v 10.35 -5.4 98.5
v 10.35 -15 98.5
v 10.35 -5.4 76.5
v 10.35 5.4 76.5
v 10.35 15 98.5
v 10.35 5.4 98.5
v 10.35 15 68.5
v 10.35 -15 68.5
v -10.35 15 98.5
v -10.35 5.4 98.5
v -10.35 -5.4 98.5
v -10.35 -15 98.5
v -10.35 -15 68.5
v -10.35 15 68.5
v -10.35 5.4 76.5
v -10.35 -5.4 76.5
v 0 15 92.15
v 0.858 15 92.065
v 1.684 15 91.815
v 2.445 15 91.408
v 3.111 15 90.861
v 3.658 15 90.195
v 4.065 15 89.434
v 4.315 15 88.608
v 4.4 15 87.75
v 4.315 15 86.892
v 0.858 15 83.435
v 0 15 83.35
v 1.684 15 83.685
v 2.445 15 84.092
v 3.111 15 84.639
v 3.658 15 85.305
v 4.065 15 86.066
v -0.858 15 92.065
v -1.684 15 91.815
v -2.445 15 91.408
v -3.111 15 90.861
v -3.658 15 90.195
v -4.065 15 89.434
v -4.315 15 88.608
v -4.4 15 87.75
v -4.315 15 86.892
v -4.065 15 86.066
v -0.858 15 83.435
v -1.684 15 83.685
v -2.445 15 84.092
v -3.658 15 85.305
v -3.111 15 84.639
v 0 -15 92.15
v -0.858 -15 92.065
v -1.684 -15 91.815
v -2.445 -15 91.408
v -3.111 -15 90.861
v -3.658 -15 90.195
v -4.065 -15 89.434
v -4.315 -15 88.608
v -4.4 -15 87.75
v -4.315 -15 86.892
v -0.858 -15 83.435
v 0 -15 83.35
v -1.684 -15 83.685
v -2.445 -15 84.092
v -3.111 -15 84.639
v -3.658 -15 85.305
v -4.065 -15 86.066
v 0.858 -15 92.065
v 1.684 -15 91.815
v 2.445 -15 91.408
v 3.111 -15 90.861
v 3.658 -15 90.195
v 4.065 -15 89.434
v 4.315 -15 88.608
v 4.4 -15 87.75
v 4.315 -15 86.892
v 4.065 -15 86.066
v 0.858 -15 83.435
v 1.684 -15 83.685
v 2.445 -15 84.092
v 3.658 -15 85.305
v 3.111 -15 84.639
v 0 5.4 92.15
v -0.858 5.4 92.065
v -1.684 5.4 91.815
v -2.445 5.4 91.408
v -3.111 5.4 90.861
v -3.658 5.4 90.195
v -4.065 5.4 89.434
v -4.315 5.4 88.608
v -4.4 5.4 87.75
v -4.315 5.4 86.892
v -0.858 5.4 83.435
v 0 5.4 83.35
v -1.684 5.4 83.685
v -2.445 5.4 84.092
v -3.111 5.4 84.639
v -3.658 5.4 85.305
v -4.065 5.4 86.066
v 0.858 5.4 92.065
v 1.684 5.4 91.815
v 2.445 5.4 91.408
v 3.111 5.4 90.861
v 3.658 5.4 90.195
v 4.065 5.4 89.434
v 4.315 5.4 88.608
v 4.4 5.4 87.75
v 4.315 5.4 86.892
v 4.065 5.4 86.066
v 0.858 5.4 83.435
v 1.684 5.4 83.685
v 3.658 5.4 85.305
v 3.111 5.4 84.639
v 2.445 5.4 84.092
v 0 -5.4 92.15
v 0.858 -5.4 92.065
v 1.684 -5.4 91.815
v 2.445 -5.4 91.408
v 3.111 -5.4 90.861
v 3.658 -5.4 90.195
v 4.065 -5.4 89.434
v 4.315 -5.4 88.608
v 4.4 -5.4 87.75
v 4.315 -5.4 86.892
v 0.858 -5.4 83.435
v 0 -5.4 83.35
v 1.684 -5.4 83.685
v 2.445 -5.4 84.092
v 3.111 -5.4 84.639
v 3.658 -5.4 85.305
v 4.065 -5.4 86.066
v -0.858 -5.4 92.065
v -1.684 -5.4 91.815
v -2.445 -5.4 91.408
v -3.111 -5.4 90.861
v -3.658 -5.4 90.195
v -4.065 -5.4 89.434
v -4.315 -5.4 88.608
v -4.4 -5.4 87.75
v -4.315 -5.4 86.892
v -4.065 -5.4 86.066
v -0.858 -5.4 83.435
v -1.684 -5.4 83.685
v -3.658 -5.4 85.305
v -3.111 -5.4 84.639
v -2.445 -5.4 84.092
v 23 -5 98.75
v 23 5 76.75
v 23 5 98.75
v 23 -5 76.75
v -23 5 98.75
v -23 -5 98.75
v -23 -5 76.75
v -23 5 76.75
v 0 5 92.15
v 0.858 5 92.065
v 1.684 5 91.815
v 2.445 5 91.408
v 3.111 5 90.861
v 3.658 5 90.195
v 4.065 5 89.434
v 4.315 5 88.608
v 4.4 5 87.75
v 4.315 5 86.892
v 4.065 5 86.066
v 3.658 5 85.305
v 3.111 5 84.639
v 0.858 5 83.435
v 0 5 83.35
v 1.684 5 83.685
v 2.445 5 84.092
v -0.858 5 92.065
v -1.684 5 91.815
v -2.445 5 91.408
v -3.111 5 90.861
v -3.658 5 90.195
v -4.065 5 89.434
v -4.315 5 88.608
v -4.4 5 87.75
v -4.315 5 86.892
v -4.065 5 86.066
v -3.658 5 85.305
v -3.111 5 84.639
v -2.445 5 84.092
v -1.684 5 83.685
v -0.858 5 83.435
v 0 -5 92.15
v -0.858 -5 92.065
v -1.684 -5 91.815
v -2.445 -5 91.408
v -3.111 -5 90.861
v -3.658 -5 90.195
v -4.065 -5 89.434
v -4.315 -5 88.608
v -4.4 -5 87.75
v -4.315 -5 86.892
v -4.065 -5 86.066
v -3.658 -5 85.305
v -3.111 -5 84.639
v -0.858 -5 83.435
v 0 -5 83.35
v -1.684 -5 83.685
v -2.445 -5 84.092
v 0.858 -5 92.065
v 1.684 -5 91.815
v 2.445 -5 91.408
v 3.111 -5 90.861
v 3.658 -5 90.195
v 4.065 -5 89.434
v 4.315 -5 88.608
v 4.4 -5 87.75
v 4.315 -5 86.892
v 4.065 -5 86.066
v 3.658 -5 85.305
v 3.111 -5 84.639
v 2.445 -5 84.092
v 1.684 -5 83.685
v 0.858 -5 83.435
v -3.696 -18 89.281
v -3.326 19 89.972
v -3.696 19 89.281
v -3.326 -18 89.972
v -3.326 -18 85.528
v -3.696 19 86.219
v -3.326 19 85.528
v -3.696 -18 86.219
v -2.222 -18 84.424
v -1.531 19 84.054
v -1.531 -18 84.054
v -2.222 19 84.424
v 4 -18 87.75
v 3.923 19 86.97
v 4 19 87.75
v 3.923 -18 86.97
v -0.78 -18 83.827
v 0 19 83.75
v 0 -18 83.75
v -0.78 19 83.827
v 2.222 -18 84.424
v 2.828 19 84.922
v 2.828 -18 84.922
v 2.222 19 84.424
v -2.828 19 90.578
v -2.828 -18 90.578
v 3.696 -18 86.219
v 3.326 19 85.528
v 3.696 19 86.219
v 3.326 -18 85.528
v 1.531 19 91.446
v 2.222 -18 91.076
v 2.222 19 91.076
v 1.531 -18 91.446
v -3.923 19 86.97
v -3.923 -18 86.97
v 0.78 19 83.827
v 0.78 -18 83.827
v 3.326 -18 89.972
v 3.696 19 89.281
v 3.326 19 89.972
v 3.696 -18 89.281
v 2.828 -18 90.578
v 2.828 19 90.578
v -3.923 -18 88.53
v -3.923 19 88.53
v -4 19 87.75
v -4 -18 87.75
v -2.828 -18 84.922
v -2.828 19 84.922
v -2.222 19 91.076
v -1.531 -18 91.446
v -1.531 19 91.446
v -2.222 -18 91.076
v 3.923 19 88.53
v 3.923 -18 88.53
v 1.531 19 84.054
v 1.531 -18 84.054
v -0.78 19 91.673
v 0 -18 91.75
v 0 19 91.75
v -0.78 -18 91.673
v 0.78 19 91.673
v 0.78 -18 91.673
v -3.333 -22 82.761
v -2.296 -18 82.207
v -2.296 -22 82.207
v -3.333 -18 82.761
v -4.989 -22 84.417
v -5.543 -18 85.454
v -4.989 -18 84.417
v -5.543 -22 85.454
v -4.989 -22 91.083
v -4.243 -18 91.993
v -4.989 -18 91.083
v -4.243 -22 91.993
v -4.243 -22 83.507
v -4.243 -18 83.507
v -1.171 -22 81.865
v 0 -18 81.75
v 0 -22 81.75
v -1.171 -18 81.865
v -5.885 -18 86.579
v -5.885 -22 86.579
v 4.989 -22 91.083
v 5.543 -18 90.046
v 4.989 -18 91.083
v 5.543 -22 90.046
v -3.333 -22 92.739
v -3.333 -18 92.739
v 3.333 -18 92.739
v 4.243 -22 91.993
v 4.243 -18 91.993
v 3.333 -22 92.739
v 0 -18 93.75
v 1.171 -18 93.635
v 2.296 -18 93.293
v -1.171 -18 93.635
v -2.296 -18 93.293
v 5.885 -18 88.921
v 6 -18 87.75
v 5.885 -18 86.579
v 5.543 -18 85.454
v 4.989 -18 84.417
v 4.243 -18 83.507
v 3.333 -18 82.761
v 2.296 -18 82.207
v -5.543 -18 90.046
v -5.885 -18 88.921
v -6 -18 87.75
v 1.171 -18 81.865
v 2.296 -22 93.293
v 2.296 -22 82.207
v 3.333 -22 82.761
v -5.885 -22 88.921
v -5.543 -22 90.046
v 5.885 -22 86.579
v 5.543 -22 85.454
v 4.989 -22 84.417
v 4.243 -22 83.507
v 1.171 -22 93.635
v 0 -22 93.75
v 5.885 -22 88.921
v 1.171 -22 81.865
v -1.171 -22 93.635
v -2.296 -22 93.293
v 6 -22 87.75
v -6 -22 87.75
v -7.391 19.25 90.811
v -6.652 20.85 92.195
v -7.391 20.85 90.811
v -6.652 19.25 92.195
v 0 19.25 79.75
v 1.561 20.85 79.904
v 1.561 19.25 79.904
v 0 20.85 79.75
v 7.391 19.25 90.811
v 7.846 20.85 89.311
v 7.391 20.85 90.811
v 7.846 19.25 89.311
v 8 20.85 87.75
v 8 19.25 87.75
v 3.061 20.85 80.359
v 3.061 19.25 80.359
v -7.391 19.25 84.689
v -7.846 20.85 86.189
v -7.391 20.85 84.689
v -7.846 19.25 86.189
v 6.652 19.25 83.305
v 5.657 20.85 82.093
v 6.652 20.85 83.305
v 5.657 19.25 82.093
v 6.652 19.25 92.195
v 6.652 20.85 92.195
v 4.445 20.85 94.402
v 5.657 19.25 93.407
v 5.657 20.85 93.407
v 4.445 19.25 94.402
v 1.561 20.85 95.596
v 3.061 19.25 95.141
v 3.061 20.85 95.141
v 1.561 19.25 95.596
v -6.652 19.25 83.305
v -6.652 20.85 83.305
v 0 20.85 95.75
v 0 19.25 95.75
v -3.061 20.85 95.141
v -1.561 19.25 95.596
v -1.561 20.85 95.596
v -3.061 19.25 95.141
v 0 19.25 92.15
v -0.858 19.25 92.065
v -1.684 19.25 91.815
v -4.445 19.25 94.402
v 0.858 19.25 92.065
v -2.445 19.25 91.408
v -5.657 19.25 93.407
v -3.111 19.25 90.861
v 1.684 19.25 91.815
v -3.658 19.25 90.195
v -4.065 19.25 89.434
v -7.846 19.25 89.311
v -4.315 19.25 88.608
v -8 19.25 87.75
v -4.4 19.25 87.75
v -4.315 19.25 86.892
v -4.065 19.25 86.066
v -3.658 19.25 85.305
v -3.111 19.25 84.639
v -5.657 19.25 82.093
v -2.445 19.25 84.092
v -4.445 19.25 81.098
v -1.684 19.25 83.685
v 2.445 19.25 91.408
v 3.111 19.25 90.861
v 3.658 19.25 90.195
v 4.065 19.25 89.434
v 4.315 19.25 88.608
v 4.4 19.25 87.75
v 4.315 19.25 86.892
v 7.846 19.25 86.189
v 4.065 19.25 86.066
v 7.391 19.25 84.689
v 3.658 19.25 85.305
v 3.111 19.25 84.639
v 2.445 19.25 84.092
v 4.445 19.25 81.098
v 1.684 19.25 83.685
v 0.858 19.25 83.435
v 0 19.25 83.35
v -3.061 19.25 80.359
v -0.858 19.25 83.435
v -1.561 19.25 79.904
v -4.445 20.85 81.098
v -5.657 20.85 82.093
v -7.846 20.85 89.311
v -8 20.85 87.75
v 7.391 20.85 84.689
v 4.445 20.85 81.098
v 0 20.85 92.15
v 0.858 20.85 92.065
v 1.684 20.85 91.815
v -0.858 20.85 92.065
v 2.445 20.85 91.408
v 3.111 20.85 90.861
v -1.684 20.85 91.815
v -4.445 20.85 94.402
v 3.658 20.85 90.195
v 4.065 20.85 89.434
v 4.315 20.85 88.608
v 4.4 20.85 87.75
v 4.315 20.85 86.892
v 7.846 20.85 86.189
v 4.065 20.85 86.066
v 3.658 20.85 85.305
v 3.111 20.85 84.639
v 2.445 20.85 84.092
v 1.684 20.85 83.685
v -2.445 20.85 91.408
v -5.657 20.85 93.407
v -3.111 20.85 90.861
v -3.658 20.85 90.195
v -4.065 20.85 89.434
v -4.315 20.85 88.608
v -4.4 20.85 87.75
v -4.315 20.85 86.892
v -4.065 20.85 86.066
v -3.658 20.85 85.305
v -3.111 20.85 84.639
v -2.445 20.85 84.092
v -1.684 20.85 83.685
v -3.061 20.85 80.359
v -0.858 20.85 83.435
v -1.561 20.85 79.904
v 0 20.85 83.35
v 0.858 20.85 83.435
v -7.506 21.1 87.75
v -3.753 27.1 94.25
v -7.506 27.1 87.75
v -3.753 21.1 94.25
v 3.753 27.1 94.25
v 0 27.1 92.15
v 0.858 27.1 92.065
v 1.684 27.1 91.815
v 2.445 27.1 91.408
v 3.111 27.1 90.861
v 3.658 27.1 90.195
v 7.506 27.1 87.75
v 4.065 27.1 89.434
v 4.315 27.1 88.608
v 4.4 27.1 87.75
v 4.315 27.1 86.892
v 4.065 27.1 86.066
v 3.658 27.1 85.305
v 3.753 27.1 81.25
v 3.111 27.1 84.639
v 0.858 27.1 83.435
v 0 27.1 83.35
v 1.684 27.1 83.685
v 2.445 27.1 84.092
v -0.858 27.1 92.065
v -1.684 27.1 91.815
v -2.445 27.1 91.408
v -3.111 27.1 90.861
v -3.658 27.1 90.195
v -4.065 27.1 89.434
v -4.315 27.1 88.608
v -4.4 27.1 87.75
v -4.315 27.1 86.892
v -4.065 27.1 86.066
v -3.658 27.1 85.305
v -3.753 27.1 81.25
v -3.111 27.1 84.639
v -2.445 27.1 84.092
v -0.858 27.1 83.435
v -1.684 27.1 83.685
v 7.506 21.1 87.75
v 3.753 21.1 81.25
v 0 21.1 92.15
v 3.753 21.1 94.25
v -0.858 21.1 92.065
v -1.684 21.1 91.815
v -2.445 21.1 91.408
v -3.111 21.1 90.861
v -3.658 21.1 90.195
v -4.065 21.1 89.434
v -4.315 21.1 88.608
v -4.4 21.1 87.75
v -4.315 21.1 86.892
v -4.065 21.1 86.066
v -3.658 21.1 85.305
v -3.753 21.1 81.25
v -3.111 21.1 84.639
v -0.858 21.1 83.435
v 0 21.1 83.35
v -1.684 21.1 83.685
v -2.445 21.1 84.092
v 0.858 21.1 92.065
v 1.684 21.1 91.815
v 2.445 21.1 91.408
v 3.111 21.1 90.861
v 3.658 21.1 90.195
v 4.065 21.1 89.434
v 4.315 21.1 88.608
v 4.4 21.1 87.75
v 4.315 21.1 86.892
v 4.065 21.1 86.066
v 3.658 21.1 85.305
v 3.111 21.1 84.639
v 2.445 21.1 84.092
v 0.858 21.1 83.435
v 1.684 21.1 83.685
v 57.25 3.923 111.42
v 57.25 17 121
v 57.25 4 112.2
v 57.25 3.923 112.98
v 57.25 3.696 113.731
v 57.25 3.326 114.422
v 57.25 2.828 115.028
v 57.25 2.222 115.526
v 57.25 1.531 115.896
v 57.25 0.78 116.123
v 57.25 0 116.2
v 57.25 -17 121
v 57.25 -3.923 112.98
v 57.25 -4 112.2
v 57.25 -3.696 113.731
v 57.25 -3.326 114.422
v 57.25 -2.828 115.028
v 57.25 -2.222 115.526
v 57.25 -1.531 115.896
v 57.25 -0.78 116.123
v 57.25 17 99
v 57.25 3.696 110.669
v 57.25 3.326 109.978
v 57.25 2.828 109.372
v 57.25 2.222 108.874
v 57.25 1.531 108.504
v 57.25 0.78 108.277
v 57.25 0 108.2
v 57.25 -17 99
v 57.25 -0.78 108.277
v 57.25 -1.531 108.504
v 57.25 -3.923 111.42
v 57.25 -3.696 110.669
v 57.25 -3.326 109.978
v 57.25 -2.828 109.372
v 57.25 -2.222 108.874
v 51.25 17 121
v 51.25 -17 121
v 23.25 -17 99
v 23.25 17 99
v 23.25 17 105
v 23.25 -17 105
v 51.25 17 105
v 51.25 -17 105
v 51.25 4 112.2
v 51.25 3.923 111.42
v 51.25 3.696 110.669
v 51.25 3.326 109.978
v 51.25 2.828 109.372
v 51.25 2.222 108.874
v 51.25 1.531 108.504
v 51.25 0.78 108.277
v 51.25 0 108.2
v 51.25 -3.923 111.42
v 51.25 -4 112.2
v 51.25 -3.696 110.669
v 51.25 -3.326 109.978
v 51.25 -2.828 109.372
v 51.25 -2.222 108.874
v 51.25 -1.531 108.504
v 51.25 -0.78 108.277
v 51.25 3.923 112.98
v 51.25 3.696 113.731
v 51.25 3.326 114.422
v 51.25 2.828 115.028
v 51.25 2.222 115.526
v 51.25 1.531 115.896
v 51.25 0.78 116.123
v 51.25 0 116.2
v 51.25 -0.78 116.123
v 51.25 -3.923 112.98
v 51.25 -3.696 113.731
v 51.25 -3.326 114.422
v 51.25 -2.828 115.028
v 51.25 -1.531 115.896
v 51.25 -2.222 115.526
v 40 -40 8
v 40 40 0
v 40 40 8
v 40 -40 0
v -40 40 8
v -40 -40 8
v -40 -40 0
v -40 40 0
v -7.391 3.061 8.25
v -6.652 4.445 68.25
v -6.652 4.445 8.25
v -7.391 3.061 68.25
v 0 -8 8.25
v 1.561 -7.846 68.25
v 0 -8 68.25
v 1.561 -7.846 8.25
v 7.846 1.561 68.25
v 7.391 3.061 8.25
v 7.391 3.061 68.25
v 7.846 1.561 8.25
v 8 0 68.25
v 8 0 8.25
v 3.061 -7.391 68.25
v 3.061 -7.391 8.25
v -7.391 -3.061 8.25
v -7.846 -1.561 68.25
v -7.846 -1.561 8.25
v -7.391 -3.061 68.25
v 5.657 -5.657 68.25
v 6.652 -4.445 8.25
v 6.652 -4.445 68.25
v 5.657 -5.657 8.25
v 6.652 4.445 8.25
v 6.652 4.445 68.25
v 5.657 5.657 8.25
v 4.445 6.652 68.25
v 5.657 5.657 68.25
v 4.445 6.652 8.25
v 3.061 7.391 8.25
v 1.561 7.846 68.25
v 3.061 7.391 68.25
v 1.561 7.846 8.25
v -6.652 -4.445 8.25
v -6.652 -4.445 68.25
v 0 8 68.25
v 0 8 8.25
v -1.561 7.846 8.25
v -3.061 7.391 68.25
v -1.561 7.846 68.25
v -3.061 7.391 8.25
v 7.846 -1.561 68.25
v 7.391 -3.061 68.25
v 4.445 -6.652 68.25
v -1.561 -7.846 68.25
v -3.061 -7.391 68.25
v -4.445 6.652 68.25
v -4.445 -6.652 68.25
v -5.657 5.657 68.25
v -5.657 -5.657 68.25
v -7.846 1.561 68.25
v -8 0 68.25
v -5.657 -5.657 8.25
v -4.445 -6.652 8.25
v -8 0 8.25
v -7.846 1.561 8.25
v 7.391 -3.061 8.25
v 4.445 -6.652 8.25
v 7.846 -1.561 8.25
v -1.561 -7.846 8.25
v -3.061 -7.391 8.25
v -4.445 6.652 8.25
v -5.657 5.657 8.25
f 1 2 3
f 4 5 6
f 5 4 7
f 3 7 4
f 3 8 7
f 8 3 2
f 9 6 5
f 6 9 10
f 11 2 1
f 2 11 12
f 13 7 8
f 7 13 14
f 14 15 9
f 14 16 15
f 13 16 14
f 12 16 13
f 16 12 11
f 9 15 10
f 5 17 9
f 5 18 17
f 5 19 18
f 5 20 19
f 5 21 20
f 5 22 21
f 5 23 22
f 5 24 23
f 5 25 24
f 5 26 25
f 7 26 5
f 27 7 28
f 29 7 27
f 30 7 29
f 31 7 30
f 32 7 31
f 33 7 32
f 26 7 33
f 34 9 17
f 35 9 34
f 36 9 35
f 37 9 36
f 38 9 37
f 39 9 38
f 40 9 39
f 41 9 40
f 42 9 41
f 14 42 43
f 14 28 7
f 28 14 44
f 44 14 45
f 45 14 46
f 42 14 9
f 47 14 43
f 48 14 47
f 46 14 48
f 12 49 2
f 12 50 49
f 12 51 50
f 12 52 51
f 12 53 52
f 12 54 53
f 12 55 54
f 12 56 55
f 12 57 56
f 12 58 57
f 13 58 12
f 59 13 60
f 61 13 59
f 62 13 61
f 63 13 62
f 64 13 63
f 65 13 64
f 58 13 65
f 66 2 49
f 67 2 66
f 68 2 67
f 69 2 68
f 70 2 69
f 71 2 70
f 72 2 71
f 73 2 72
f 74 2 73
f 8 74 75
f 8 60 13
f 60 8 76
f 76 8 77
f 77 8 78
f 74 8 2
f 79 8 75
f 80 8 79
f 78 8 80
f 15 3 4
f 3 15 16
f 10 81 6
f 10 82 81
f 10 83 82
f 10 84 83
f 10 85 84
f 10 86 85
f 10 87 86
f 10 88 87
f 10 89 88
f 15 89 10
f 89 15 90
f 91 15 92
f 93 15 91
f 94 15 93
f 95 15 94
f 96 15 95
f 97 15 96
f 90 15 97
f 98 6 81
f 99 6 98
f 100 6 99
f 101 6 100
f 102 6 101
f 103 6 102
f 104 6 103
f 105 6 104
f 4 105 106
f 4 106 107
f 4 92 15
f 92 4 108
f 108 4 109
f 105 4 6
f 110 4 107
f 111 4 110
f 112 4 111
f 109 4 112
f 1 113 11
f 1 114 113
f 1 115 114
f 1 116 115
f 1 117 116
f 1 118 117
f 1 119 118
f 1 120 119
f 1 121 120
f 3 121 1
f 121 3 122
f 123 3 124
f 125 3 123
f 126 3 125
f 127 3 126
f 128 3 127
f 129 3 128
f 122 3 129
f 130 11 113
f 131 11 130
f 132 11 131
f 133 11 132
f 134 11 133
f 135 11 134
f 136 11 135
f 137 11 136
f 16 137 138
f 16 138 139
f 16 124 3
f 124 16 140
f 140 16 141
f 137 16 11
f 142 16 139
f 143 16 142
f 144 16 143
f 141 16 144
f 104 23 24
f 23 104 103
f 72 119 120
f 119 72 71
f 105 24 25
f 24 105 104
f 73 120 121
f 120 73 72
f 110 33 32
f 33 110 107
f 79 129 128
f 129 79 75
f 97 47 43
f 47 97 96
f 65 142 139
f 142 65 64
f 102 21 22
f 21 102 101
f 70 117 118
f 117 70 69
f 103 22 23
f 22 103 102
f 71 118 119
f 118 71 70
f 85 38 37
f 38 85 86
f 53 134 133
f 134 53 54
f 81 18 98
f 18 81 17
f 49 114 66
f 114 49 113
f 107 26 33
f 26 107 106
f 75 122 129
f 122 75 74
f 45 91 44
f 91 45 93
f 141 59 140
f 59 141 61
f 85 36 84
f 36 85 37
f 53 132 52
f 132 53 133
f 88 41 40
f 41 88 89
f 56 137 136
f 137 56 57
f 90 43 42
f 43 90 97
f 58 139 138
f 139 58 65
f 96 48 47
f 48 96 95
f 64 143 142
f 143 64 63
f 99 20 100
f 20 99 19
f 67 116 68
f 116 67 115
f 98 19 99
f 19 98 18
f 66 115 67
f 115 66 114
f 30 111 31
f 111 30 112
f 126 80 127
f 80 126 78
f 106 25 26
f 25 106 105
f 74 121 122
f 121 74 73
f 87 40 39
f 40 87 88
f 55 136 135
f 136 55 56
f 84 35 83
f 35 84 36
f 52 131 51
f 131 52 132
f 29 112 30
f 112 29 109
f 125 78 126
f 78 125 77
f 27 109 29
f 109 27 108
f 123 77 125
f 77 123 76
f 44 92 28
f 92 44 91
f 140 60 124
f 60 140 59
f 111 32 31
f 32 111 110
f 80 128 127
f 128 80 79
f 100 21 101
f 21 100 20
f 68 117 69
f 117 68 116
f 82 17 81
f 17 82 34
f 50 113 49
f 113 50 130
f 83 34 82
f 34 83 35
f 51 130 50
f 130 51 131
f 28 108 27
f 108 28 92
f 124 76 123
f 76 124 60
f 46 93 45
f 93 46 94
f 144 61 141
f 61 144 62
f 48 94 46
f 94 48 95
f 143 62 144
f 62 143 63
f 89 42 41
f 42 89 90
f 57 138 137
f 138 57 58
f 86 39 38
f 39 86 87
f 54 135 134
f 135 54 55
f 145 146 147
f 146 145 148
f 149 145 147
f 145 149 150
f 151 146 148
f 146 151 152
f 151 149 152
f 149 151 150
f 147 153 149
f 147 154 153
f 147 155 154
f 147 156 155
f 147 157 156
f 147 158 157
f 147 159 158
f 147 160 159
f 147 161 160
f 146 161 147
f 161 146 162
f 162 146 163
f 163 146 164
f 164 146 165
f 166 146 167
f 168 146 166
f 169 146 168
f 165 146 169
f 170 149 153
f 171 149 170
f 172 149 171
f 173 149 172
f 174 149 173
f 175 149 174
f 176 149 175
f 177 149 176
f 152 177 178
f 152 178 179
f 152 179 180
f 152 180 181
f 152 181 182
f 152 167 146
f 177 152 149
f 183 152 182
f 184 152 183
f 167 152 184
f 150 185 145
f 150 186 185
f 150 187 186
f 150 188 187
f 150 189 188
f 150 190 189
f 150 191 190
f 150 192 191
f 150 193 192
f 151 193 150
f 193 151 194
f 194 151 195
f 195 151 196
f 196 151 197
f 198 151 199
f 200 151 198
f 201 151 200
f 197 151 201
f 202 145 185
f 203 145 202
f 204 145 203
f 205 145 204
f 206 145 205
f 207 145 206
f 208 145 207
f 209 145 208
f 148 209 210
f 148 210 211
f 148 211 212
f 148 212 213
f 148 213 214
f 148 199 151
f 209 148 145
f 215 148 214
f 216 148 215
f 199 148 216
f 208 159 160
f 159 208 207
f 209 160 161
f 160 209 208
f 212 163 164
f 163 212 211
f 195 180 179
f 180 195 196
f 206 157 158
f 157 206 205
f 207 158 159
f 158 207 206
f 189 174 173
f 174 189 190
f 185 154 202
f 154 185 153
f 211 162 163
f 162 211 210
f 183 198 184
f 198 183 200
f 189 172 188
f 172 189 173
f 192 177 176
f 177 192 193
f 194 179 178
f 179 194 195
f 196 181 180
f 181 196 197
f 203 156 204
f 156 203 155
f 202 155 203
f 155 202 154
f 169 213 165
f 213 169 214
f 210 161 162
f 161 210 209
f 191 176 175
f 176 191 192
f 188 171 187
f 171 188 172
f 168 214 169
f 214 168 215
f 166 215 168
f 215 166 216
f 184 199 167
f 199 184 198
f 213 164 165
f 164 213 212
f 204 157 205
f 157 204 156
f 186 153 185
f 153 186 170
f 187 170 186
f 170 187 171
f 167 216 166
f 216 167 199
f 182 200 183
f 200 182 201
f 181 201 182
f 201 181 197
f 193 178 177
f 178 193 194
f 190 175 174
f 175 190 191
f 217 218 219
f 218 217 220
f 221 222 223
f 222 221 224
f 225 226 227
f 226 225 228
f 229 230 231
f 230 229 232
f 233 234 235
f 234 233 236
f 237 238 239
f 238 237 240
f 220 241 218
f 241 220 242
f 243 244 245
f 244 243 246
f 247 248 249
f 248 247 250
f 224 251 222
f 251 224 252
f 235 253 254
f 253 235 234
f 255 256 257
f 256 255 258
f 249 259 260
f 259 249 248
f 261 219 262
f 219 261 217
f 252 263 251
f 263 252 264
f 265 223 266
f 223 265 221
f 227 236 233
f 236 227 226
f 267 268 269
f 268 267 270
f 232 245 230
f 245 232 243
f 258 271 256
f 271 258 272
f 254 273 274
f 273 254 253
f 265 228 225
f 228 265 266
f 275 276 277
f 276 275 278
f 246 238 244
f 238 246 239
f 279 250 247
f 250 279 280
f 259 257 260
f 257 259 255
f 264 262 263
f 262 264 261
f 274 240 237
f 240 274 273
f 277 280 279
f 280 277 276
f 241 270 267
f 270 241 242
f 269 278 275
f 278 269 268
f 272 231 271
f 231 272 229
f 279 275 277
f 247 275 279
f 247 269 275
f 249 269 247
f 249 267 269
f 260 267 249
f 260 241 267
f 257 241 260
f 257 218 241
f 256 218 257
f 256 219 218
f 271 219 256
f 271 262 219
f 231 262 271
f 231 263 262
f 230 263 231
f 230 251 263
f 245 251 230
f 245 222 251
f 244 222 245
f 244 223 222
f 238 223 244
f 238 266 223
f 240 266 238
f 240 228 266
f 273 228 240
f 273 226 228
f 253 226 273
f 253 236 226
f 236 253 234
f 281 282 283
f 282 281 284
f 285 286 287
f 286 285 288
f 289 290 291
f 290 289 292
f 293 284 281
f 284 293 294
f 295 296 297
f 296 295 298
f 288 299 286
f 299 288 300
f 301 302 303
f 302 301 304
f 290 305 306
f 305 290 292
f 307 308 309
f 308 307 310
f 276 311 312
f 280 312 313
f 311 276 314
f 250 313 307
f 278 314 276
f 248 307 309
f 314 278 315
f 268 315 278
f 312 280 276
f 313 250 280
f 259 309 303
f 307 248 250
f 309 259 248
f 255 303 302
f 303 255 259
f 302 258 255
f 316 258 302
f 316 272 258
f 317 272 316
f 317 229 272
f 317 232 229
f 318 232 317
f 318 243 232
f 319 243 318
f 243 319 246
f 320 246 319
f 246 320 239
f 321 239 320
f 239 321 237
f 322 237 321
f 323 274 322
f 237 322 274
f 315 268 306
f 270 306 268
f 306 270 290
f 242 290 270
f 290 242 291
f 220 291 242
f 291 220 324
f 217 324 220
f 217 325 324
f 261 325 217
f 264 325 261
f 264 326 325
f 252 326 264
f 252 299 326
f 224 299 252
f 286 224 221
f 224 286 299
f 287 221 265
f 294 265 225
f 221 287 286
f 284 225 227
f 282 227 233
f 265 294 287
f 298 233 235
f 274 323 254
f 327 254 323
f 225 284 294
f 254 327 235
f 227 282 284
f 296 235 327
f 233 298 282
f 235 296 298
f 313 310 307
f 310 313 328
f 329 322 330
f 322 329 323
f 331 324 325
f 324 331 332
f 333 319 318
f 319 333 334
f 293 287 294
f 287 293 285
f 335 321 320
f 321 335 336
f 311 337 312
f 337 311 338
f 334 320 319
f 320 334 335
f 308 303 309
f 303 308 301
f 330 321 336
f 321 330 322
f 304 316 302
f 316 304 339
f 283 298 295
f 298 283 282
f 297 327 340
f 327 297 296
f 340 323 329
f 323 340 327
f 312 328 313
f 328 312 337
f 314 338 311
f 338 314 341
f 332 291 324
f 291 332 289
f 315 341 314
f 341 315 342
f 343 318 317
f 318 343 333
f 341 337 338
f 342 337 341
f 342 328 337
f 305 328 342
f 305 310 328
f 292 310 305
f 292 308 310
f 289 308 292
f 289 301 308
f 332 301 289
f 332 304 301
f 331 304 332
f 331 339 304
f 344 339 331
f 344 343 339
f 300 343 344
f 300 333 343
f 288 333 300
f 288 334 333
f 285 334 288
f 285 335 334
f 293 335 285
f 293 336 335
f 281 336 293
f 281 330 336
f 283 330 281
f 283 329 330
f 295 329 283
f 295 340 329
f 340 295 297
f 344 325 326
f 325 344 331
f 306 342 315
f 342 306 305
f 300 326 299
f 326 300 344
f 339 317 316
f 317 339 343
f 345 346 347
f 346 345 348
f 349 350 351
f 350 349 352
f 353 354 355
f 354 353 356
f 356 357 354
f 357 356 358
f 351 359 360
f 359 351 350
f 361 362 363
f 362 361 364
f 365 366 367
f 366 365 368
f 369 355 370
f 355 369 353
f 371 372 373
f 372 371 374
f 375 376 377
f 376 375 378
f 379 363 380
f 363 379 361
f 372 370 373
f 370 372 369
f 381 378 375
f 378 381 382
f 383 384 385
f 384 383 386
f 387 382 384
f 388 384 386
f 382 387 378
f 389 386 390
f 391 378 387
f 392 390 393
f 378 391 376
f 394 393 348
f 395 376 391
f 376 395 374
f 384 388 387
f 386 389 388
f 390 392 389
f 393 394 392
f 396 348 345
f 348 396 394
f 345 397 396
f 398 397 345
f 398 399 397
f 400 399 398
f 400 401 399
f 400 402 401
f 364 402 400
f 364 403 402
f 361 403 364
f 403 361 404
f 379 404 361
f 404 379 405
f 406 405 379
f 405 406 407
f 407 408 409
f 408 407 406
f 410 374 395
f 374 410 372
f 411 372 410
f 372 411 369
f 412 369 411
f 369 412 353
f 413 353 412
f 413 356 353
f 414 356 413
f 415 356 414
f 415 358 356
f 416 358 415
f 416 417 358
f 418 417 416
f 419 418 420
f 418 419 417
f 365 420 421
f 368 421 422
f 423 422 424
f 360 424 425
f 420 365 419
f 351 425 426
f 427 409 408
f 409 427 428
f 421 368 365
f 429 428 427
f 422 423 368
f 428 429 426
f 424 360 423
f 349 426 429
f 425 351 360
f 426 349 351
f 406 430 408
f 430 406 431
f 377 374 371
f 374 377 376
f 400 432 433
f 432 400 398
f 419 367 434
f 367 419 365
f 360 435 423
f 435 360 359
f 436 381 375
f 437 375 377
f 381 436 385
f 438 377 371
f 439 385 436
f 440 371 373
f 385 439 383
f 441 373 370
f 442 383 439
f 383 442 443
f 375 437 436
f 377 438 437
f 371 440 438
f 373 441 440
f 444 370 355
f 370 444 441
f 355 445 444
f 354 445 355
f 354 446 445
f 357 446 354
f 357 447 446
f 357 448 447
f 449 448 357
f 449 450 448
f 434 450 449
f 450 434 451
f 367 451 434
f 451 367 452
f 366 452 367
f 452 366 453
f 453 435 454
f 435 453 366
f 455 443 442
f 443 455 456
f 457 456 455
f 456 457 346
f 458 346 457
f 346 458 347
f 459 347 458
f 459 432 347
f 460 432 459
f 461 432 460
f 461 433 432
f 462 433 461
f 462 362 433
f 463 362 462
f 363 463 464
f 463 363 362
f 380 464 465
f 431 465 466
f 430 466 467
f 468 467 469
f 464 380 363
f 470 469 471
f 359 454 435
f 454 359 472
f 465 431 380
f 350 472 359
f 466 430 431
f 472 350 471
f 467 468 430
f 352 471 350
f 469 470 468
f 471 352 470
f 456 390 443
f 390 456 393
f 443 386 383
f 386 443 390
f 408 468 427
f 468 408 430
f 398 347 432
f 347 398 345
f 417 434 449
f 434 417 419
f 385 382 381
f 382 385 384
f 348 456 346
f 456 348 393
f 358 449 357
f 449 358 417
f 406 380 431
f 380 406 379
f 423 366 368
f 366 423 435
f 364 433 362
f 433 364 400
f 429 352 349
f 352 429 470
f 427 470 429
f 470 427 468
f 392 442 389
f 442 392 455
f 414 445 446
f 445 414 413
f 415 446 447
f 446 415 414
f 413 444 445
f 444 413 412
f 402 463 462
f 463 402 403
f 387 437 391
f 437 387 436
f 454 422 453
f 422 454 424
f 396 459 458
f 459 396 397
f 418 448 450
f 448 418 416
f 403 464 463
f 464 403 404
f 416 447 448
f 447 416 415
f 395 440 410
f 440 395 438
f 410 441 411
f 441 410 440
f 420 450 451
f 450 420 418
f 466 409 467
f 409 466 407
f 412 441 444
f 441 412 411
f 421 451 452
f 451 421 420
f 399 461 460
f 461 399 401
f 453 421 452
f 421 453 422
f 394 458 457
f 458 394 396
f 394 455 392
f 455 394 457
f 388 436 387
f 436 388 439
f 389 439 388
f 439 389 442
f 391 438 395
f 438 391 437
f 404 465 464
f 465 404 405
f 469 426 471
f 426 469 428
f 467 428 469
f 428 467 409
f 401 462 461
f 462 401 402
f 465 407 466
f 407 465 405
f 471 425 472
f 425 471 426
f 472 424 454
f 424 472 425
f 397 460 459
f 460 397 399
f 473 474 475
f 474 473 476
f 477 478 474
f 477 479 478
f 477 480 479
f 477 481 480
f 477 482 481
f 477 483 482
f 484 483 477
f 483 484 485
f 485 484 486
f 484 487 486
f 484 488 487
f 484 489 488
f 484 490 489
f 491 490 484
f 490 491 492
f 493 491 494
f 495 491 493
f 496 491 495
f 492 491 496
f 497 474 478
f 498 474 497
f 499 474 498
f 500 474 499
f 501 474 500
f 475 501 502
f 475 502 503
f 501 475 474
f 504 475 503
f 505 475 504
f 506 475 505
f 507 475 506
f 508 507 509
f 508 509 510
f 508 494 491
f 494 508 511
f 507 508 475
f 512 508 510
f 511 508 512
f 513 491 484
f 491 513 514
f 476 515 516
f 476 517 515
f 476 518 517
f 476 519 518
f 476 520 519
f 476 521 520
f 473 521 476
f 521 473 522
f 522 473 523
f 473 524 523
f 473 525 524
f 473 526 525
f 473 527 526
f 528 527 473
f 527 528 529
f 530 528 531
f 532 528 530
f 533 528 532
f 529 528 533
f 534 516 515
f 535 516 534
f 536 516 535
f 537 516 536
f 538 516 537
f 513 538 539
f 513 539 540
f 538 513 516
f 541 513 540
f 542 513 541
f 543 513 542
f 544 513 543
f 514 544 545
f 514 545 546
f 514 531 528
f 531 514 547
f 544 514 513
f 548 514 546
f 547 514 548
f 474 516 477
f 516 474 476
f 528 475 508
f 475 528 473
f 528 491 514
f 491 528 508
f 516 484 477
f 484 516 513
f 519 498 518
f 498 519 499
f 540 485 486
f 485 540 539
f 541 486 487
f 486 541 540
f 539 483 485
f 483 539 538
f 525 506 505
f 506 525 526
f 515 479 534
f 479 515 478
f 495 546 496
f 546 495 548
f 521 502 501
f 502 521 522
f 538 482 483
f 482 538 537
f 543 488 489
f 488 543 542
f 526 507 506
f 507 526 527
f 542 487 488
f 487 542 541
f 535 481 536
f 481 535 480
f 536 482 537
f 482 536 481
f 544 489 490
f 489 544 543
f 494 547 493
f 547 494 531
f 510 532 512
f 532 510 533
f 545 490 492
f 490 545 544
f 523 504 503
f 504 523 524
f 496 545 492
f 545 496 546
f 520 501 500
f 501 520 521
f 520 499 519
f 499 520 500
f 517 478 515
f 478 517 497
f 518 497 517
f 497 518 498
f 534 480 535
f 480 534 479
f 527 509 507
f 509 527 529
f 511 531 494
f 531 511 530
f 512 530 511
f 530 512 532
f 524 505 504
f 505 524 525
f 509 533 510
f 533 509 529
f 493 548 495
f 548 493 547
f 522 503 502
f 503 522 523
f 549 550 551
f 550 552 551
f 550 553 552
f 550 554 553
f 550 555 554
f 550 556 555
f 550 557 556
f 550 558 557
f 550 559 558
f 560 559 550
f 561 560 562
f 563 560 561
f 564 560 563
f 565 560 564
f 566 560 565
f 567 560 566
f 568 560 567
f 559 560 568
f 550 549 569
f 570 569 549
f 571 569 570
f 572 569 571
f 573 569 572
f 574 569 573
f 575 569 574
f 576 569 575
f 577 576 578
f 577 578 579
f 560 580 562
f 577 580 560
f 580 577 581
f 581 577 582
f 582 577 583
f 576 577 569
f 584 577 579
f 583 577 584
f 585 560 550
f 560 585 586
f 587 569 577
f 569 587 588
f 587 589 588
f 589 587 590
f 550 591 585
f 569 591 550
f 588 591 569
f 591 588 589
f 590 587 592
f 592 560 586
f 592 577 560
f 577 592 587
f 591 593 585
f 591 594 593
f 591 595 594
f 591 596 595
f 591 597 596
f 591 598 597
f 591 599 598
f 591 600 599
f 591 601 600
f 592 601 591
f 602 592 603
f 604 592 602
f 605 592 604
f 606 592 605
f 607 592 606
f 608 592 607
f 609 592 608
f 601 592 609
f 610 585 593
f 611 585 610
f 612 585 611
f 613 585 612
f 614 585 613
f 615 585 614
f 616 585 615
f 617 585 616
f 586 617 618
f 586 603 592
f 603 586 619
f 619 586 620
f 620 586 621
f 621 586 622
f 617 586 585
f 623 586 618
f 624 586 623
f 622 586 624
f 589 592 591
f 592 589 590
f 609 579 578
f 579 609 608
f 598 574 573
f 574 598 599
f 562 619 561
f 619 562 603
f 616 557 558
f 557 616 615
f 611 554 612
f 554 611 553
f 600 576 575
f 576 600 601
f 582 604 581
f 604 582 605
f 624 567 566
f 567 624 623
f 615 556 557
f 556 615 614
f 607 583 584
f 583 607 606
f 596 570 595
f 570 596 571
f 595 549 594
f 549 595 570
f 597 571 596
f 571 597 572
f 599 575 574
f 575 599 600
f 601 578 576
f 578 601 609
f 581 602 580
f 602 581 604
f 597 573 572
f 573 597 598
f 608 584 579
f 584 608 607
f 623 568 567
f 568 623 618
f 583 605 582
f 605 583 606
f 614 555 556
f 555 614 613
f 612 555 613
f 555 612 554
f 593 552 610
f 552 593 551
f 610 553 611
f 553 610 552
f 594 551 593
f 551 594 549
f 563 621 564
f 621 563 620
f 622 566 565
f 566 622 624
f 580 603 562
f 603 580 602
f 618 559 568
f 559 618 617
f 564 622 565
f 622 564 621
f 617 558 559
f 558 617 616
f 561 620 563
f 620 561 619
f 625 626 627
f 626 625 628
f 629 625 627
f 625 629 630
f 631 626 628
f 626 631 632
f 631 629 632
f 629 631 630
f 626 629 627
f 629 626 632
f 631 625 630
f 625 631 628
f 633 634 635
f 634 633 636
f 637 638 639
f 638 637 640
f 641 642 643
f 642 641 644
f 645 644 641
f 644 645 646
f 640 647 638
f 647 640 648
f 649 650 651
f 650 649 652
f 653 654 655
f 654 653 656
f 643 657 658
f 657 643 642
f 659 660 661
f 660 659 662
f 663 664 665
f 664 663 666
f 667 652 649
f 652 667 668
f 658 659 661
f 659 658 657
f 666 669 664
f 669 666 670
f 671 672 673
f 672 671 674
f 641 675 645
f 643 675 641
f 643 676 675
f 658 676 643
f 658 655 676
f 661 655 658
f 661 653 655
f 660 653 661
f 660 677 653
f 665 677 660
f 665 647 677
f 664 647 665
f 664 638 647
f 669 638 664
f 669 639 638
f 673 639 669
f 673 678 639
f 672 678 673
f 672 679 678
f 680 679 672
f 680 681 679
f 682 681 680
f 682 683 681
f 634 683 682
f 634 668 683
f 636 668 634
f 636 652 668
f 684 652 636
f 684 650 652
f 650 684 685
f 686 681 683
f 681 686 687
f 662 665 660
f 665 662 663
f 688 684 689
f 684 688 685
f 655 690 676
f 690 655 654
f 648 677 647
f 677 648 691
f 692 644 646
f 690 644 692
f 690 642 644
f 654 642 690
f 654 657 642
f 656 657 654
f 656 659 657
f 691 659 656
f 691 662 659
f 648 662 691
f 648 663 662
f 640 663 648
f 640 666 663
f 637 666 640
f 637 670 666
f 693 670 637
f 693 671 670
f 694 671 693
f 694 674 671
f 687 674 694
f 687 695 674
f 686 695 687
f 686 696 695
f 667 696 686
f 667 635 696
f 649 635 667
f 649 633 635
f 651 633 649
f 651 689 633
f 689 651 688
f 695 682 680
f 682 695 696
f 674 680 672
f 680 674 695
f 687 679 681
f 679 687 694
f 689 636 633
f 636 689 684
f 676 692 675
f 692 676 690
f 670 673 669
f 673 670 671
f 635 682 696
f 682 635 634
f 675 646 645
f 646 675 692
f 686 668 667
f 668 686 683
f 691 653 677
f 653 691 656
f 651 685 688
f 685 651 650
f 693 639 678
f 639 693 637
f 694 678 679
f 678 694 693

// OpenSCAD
$fn = 32;

// ------------------------------------------------------------------------
// Lamp arm: column d16 x 60 mm, arm 46 mm
// Every part is its own module, assembly() places every instance.
// ------------------------------------------------------------------------

// --- part 1 ---
module lamp_base() {
  difference() {
    translate([-40, -40, 0]) cube([80, 80, 8]);
  }
}

// --- part 2 ---
module lamp_column() {
  cylinder(h = 60, d = 16);
}

// --- part 3 ---
module head_fork() {
  difference() {
    translate([-10.35, -15, 0]) cube([20.7, 30, 30]);
    translate([-11.35, -5.4, 8]) cube([22.7, 10.8, 23]);
    translate([0, 0, 19.25]) rotate([90, 0, 0]) cylinder(h = 32, d = 8.8, center = true);
  }
}

// --- part 4 ---
module lamp_arm() {
  difference() {
    translate([-23, -5, 0]) cube([46, 10, 22]);
    translate([0, 0, 11]) rotate([90, 0, 0]) cylinder(h = 12, d = 8.8, center = true);
  }
}

// --- part 5 ---
module arm_pin() {
  rotate([0, 90, 0]) cylinder(h = 38, d = 8, center = true);
  translate([-22, 0, 0]) rotate([0, 90, 0]) cylinder(h = 4, d = 12);
}

// --- part 6 ---
module arm_washer() {
  difference() {
      translate([0, 0, 0]) cylinder(h = 1.6, d = 16);
      translate([0, 0, -1]) cylinder(h = 3.6, d = 8.8);
    }
}

// --- part 7 ---
module arm_nut() {
  difference() {
    linear_extrude(height = 6) polygon(points = [[7.506, 0], [3.753, 6.5], [-3.753, 6.5], [-7.506, 0], [-3.753, -6.5], [3.753, -6.5]]);
    translate([0, 0, -1]) cylinder(h = 8, d = 8.8);
  }
}

// --- part 8 ---
module shade_bracket() {
  difference() {
    translate([-17, -17, 0]) cube([34, 34, 22]);
    translate([-18, -18, 6]) cube([29, 36, 17]);
    translate([14, 0, 13.2]) rotate([0, 90, 0]) cylinder(h = 8, d = 8, center = true);
  }
}

// --- assembly ---
module assembly() {
  color([0.80, 0.24, 0.20]) translate([0, 0, 0]) rotate([0, 0, 0]) lamp_base();
  color([0.20, 0.45, 0.75]) translate([0, 0, 8.25]) rotate([0, 0, 0]) lamp_column();
  color([0.25, 0.62, 0.32]) translate([0, 0, 68.5]) rotate([0, 0, 0]) head_fork();
  color([0.92, 0.70, 0.18]) translate([0, 0, 76.75]) rotate([0, 0, 0]) lamp_arm();
  color([0.58, 0.35, 0.70]) translate([0, 0, 87.75]) rotate([0, 0, 90]) arm_pin();
  color([0.16, 0.66, 0.66]) translate([0, 20.85, 87.75]) rotate([90, 0, 0]) arm_washer();
  color([0.85, 0.48, 0.18]) translate([0, 27.1, 87.75]) rotate([90, 0, 0]) arm_nut();
  color([0.55, 0.60, 0.65]) translate([40.25, 0, 99]) rotate([0, 0, 0]) shade_bracket();
}

assembly();
